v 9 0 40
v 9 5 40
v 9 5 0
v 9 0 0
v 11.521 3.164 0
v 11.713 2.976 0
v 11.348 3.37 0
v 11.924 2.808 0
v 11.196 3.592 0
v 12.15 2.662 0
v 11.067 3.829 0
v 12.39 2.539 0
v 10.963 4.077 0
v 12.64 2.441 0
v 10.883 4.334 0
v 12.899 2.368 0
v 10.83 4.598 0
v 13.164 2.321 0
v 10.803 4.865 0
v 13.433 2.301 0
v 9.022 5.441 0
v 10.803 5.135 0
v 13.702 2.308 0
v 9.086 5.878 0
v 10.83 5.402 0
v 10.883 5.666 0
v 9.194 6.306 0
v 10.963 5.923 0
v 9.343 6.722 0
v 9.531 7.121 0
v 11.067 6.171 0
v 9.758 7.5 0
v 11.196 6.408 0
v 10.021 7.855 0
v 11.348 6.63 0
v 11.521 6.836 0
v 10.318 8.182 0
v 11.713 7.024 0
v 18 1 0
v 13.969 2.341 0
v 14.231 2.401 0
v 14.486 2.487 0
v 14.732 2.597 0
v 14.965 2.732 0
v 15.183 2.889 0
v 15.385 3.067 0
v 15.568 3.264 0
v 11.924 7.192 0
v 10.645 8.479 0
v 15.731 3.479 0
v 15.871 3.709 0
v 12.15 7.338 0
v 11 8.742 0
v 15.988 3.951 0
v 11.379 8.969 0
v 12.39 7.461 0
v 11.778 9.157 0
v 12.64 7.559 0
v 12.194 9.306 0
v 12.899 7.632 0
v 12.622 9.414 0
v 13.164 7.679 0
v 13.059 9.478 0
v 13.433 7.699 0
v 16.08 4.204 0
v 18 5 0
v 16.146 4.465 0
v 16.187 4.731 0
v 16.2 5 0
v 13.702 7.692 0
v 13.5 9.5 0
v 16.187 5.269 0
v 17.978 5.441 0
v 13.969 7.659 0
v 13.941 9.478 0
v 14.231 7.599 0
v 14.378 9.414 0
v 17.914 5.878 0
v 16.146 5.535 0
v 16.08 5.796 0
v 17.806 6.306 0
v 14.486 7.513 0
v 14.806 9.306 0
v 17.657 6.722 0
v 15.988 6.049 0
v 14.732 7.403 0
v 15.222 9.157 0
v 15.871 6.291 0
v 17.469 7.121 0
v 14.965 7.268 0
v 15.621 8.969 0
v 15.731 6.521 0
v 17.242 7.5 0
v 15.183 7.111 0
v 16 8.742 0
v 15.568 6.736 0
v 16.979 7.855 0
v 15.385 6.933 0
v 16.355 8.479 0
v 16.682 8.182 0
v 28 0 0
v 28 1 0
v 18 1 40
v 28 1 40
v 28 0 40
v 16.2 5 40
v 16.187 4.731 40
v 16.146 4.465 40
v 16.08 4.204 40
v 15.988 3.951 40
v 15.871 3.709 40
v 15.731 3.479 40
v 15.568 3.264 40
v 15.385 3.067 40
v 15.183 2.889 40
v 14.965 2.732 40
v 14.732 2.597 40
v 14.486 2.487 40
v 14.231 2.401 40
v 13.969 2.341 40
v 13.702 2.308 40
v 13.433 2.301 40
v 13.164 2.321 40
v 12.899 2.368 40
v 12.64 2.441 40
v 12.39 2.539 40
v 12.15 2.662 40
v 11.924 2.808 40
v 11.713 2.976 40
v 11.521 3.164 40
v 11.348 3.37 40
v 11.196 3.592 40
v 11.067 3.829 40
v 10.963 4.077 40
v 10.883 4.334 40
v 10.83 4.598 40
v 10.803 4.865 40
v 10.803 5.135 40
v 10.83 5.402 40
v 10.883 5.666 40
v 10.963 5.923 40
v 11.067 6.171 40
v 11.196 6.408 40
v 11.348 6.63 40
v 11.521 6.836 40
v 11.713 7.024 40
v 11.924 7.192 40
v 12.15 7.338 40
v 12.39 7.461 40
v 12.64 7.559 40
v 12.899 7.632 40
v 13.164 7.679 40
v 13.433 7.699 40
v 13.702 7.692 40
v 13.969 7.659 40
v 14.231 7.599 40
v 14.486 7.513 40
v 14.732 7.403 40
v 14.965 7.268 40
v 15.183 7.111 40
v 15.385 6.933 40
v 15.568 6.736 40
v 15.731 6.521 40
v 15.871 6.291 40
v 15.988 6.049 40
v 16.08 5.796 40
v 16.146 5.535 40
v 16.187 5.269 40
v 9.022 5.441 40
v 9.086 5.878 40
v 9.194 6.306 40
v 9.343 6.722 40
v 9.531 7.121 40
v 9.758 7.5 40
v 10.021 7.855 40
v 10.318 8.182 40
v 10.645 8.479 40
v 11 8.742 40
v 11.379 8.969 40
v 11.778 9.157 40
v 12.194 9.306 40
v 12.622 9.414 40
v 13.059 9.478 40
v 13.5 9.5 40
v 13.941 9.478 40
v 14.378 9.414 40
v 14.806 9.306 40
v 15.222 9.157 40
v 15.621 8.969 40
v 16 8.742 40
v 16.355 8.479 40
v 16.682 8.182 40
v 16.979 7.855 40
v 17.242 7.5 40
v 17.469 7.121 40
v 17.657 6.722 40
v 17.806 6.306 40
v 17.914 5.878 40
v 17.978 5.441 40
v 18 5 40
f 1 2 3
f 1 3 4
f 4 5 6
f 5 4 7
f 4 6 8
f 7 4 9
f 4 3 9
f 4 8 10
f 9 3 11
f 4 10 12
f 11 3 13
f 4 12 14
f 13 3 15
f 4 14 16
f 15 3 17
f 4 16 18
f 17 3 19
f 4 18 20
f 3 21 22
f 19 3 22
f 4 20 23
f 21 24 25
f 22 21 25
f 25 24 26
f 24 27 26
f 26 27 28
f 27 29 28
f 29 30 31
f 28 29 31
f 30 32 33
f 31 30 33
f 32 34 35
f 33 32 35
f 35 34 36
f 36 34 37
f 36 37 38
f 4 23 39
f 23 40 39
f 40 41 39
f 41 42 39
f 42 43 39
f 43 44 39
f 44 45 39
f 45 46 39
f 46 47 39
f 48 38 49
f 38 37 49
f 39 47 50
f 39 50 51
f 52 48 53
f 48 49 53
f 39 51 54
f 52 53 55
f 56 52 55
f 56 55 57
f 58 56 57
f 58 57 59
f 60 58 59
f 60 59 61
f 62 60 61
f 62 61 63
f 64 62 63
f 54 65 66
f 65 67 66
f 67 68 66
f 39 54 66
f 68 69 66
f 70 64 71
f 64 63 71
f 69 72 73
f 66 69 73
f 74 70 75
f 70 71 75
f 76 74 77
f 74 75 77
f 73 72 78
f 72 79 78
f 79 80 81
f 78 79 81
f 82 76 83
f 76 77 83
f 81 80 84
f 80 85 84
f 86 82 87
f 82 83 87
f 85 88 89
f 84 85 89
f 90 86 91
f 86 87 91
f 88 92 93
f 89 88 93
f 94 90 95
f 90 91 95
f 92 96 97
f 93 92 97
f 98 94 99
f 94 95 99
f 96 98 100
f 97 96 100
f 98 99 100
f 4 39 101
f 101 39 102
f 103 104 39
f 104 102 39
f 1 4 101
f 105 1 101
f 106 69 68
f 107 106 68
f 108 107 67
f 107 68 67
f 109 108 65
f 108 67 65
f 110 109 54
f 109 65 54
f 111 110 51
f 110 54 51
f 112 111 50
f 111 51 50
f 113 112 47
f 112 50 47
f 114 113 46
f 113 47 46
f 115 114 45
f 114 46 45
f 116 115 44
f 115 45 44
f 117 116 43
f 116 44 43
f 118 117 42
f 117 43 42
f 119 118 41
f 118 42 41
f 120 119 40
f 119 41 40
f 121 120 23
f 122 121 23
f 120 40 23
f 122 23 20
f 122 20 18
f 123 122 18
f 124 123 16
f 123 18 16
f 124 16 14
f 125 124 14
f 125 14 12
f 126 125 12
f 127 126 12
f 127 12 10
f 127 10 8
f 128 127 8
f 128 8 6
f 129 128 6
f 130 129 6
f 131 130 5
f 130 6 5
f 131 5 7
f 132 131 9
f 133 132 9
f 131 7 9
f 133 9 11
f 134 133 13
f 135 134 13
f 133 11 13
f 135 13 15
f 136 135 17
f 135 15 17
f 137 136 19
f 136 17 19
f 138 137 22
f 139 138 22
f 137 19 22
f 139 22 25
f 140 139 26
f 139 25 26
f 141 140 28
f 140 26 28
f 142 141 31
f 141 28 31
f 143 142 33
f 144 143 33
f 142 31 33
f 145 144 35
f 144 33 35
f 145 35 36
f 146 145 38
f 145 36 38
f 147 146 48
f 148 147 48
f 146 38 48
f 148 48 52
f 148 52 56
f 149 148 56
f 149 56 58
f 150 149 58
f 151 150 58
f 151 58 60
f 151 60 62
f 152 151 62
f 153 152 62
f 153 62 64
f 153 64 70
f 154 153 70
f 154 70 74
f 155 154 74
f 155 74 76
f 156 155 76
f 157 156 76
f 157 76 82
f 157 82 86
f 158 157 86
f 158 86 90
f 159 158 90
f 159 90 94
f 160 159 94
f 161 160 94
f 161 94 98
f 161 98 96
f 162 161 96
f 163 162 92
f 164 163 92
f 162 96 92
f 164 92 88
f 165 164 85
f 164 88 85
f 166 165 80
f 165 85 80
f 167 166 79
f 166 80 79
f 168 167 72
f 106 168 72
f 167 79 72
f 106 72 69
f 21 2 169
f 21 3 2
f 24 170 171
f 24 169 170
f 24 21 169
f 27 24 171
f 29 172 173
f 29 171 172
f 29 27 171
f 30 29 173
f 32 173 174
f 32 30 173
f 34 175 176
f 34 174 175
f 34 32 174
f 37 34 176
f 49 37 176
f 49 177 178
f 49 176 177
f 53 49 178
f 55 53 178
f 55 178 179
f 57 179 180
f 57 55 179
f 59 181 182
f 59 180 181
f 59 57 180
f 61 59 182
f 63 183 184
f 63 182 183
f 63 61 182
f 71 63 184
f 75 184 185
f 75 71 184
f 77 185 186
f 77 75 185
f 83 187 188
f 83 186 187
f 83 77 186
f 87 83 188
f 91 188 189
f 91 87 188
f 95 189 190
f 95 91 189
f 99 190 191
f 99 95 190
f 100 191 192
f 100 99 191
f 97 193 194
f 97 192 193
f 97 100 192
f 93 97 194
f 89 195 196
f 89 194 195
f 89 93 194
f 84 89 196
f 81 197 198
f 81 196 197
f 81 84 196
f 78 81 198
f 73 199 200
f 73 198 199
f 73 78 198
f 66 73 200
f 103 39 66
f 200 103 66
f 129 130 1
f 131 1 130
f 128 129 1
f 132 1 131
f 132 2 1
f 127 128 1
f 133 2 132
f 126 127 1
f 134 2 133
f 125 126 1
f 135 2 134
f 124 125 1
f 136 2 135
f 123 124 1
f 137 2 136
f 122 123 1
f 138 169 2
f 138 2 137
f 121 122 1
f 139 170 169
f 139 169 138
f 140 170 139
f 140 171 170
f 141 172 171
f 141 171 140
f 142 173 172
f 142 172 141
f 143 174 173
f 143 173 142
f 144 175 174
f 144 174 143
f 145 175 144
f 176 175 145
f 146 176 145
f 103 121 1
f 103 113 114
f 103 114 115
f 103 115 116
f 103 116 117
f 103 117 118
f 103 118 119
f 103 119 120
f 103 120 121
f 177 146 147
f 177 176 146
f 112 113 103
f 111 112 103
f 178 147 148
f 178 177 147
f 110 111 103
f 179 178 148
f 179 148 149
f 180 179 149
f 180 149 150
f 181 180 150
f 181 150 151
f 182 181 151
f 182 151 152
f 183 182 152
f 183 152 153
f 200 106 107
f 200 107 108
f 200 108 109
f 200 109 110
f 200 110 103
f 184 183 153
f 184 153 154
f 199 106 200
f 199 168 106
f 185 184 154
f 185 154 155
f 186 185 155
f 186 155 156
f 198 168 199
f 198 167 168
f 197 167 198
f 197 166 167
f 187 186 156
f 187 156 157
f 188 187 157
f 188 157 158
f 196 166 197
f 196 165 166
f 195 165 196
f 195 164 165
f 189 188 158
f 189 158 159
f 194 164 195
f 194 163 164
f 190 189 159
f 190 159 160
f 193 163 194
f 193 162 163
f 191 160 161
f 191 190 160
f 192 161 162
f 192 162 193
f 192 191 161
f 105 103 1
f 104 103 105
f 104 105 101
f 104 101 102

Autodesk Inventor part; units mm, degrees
ref_plane "YZ Plane" through (0, 0, 0) normal (1, 0, 0) x (0, 1, 0)
ref_plane "XZ Plane" through (0, 0, 0) normal (0, 1, 0) x (-1, 0, 0)
ref_plane "XY Plane" through (0, 0, 0) normal (0, 0, 1) x (1, 0, 0)
sketch "Sketch1" plane through (0, 0, 0) normal (0, 0, 1) x (1, 0, 0)
  line L0 (9, 0) -> (28, 0)
  line L1 (28, 0) -> (28, 1)
  line L2 (28, 1) -> (9, 1)
  line L3 (9, 1) -> (18, 1)
  line L4 (18, 1) -> (18, 5)
  line L5 (18, 5) -> (9, 5)
  line L6 (9, 5) -> (9, 1)
  circle A0 centre (13.5, 5) radius 4.5
  circle A1 centre (13.5, 5) radius 2.5
  line L7 (9, 1) -> (9, 0)
  point P0 (0, 0)
  point P1 (28, 0.5)
  point P2 (18, 1)
  point P3 (11.4384, 1)
  point P4 (15.5616, 1)
  dimension "d1" = 1
  dimension "d2" = 5
  dimension "d3" = 5
  dimension "d4" = 2
  dimension "d5" = 10
  dimension "d11" = 9
extrude "Extrusion1" add sketch "Sketch1" along normal blind 40 contours L7 L2 A0 L1 L0 | L6 A0 L2 | A0 L5 A1 L2 | L2 A0 | A0 L5 A1 | L2 A0 L4
thicken "Thicken1" operation cut thickness 0.2 both sides no extend neighbours no toward (0.9870503, -0.1604113, 0) faces at (15.9676, 4.599, 26.6667)
properties part number "LI0017-LATCH BARREL"
